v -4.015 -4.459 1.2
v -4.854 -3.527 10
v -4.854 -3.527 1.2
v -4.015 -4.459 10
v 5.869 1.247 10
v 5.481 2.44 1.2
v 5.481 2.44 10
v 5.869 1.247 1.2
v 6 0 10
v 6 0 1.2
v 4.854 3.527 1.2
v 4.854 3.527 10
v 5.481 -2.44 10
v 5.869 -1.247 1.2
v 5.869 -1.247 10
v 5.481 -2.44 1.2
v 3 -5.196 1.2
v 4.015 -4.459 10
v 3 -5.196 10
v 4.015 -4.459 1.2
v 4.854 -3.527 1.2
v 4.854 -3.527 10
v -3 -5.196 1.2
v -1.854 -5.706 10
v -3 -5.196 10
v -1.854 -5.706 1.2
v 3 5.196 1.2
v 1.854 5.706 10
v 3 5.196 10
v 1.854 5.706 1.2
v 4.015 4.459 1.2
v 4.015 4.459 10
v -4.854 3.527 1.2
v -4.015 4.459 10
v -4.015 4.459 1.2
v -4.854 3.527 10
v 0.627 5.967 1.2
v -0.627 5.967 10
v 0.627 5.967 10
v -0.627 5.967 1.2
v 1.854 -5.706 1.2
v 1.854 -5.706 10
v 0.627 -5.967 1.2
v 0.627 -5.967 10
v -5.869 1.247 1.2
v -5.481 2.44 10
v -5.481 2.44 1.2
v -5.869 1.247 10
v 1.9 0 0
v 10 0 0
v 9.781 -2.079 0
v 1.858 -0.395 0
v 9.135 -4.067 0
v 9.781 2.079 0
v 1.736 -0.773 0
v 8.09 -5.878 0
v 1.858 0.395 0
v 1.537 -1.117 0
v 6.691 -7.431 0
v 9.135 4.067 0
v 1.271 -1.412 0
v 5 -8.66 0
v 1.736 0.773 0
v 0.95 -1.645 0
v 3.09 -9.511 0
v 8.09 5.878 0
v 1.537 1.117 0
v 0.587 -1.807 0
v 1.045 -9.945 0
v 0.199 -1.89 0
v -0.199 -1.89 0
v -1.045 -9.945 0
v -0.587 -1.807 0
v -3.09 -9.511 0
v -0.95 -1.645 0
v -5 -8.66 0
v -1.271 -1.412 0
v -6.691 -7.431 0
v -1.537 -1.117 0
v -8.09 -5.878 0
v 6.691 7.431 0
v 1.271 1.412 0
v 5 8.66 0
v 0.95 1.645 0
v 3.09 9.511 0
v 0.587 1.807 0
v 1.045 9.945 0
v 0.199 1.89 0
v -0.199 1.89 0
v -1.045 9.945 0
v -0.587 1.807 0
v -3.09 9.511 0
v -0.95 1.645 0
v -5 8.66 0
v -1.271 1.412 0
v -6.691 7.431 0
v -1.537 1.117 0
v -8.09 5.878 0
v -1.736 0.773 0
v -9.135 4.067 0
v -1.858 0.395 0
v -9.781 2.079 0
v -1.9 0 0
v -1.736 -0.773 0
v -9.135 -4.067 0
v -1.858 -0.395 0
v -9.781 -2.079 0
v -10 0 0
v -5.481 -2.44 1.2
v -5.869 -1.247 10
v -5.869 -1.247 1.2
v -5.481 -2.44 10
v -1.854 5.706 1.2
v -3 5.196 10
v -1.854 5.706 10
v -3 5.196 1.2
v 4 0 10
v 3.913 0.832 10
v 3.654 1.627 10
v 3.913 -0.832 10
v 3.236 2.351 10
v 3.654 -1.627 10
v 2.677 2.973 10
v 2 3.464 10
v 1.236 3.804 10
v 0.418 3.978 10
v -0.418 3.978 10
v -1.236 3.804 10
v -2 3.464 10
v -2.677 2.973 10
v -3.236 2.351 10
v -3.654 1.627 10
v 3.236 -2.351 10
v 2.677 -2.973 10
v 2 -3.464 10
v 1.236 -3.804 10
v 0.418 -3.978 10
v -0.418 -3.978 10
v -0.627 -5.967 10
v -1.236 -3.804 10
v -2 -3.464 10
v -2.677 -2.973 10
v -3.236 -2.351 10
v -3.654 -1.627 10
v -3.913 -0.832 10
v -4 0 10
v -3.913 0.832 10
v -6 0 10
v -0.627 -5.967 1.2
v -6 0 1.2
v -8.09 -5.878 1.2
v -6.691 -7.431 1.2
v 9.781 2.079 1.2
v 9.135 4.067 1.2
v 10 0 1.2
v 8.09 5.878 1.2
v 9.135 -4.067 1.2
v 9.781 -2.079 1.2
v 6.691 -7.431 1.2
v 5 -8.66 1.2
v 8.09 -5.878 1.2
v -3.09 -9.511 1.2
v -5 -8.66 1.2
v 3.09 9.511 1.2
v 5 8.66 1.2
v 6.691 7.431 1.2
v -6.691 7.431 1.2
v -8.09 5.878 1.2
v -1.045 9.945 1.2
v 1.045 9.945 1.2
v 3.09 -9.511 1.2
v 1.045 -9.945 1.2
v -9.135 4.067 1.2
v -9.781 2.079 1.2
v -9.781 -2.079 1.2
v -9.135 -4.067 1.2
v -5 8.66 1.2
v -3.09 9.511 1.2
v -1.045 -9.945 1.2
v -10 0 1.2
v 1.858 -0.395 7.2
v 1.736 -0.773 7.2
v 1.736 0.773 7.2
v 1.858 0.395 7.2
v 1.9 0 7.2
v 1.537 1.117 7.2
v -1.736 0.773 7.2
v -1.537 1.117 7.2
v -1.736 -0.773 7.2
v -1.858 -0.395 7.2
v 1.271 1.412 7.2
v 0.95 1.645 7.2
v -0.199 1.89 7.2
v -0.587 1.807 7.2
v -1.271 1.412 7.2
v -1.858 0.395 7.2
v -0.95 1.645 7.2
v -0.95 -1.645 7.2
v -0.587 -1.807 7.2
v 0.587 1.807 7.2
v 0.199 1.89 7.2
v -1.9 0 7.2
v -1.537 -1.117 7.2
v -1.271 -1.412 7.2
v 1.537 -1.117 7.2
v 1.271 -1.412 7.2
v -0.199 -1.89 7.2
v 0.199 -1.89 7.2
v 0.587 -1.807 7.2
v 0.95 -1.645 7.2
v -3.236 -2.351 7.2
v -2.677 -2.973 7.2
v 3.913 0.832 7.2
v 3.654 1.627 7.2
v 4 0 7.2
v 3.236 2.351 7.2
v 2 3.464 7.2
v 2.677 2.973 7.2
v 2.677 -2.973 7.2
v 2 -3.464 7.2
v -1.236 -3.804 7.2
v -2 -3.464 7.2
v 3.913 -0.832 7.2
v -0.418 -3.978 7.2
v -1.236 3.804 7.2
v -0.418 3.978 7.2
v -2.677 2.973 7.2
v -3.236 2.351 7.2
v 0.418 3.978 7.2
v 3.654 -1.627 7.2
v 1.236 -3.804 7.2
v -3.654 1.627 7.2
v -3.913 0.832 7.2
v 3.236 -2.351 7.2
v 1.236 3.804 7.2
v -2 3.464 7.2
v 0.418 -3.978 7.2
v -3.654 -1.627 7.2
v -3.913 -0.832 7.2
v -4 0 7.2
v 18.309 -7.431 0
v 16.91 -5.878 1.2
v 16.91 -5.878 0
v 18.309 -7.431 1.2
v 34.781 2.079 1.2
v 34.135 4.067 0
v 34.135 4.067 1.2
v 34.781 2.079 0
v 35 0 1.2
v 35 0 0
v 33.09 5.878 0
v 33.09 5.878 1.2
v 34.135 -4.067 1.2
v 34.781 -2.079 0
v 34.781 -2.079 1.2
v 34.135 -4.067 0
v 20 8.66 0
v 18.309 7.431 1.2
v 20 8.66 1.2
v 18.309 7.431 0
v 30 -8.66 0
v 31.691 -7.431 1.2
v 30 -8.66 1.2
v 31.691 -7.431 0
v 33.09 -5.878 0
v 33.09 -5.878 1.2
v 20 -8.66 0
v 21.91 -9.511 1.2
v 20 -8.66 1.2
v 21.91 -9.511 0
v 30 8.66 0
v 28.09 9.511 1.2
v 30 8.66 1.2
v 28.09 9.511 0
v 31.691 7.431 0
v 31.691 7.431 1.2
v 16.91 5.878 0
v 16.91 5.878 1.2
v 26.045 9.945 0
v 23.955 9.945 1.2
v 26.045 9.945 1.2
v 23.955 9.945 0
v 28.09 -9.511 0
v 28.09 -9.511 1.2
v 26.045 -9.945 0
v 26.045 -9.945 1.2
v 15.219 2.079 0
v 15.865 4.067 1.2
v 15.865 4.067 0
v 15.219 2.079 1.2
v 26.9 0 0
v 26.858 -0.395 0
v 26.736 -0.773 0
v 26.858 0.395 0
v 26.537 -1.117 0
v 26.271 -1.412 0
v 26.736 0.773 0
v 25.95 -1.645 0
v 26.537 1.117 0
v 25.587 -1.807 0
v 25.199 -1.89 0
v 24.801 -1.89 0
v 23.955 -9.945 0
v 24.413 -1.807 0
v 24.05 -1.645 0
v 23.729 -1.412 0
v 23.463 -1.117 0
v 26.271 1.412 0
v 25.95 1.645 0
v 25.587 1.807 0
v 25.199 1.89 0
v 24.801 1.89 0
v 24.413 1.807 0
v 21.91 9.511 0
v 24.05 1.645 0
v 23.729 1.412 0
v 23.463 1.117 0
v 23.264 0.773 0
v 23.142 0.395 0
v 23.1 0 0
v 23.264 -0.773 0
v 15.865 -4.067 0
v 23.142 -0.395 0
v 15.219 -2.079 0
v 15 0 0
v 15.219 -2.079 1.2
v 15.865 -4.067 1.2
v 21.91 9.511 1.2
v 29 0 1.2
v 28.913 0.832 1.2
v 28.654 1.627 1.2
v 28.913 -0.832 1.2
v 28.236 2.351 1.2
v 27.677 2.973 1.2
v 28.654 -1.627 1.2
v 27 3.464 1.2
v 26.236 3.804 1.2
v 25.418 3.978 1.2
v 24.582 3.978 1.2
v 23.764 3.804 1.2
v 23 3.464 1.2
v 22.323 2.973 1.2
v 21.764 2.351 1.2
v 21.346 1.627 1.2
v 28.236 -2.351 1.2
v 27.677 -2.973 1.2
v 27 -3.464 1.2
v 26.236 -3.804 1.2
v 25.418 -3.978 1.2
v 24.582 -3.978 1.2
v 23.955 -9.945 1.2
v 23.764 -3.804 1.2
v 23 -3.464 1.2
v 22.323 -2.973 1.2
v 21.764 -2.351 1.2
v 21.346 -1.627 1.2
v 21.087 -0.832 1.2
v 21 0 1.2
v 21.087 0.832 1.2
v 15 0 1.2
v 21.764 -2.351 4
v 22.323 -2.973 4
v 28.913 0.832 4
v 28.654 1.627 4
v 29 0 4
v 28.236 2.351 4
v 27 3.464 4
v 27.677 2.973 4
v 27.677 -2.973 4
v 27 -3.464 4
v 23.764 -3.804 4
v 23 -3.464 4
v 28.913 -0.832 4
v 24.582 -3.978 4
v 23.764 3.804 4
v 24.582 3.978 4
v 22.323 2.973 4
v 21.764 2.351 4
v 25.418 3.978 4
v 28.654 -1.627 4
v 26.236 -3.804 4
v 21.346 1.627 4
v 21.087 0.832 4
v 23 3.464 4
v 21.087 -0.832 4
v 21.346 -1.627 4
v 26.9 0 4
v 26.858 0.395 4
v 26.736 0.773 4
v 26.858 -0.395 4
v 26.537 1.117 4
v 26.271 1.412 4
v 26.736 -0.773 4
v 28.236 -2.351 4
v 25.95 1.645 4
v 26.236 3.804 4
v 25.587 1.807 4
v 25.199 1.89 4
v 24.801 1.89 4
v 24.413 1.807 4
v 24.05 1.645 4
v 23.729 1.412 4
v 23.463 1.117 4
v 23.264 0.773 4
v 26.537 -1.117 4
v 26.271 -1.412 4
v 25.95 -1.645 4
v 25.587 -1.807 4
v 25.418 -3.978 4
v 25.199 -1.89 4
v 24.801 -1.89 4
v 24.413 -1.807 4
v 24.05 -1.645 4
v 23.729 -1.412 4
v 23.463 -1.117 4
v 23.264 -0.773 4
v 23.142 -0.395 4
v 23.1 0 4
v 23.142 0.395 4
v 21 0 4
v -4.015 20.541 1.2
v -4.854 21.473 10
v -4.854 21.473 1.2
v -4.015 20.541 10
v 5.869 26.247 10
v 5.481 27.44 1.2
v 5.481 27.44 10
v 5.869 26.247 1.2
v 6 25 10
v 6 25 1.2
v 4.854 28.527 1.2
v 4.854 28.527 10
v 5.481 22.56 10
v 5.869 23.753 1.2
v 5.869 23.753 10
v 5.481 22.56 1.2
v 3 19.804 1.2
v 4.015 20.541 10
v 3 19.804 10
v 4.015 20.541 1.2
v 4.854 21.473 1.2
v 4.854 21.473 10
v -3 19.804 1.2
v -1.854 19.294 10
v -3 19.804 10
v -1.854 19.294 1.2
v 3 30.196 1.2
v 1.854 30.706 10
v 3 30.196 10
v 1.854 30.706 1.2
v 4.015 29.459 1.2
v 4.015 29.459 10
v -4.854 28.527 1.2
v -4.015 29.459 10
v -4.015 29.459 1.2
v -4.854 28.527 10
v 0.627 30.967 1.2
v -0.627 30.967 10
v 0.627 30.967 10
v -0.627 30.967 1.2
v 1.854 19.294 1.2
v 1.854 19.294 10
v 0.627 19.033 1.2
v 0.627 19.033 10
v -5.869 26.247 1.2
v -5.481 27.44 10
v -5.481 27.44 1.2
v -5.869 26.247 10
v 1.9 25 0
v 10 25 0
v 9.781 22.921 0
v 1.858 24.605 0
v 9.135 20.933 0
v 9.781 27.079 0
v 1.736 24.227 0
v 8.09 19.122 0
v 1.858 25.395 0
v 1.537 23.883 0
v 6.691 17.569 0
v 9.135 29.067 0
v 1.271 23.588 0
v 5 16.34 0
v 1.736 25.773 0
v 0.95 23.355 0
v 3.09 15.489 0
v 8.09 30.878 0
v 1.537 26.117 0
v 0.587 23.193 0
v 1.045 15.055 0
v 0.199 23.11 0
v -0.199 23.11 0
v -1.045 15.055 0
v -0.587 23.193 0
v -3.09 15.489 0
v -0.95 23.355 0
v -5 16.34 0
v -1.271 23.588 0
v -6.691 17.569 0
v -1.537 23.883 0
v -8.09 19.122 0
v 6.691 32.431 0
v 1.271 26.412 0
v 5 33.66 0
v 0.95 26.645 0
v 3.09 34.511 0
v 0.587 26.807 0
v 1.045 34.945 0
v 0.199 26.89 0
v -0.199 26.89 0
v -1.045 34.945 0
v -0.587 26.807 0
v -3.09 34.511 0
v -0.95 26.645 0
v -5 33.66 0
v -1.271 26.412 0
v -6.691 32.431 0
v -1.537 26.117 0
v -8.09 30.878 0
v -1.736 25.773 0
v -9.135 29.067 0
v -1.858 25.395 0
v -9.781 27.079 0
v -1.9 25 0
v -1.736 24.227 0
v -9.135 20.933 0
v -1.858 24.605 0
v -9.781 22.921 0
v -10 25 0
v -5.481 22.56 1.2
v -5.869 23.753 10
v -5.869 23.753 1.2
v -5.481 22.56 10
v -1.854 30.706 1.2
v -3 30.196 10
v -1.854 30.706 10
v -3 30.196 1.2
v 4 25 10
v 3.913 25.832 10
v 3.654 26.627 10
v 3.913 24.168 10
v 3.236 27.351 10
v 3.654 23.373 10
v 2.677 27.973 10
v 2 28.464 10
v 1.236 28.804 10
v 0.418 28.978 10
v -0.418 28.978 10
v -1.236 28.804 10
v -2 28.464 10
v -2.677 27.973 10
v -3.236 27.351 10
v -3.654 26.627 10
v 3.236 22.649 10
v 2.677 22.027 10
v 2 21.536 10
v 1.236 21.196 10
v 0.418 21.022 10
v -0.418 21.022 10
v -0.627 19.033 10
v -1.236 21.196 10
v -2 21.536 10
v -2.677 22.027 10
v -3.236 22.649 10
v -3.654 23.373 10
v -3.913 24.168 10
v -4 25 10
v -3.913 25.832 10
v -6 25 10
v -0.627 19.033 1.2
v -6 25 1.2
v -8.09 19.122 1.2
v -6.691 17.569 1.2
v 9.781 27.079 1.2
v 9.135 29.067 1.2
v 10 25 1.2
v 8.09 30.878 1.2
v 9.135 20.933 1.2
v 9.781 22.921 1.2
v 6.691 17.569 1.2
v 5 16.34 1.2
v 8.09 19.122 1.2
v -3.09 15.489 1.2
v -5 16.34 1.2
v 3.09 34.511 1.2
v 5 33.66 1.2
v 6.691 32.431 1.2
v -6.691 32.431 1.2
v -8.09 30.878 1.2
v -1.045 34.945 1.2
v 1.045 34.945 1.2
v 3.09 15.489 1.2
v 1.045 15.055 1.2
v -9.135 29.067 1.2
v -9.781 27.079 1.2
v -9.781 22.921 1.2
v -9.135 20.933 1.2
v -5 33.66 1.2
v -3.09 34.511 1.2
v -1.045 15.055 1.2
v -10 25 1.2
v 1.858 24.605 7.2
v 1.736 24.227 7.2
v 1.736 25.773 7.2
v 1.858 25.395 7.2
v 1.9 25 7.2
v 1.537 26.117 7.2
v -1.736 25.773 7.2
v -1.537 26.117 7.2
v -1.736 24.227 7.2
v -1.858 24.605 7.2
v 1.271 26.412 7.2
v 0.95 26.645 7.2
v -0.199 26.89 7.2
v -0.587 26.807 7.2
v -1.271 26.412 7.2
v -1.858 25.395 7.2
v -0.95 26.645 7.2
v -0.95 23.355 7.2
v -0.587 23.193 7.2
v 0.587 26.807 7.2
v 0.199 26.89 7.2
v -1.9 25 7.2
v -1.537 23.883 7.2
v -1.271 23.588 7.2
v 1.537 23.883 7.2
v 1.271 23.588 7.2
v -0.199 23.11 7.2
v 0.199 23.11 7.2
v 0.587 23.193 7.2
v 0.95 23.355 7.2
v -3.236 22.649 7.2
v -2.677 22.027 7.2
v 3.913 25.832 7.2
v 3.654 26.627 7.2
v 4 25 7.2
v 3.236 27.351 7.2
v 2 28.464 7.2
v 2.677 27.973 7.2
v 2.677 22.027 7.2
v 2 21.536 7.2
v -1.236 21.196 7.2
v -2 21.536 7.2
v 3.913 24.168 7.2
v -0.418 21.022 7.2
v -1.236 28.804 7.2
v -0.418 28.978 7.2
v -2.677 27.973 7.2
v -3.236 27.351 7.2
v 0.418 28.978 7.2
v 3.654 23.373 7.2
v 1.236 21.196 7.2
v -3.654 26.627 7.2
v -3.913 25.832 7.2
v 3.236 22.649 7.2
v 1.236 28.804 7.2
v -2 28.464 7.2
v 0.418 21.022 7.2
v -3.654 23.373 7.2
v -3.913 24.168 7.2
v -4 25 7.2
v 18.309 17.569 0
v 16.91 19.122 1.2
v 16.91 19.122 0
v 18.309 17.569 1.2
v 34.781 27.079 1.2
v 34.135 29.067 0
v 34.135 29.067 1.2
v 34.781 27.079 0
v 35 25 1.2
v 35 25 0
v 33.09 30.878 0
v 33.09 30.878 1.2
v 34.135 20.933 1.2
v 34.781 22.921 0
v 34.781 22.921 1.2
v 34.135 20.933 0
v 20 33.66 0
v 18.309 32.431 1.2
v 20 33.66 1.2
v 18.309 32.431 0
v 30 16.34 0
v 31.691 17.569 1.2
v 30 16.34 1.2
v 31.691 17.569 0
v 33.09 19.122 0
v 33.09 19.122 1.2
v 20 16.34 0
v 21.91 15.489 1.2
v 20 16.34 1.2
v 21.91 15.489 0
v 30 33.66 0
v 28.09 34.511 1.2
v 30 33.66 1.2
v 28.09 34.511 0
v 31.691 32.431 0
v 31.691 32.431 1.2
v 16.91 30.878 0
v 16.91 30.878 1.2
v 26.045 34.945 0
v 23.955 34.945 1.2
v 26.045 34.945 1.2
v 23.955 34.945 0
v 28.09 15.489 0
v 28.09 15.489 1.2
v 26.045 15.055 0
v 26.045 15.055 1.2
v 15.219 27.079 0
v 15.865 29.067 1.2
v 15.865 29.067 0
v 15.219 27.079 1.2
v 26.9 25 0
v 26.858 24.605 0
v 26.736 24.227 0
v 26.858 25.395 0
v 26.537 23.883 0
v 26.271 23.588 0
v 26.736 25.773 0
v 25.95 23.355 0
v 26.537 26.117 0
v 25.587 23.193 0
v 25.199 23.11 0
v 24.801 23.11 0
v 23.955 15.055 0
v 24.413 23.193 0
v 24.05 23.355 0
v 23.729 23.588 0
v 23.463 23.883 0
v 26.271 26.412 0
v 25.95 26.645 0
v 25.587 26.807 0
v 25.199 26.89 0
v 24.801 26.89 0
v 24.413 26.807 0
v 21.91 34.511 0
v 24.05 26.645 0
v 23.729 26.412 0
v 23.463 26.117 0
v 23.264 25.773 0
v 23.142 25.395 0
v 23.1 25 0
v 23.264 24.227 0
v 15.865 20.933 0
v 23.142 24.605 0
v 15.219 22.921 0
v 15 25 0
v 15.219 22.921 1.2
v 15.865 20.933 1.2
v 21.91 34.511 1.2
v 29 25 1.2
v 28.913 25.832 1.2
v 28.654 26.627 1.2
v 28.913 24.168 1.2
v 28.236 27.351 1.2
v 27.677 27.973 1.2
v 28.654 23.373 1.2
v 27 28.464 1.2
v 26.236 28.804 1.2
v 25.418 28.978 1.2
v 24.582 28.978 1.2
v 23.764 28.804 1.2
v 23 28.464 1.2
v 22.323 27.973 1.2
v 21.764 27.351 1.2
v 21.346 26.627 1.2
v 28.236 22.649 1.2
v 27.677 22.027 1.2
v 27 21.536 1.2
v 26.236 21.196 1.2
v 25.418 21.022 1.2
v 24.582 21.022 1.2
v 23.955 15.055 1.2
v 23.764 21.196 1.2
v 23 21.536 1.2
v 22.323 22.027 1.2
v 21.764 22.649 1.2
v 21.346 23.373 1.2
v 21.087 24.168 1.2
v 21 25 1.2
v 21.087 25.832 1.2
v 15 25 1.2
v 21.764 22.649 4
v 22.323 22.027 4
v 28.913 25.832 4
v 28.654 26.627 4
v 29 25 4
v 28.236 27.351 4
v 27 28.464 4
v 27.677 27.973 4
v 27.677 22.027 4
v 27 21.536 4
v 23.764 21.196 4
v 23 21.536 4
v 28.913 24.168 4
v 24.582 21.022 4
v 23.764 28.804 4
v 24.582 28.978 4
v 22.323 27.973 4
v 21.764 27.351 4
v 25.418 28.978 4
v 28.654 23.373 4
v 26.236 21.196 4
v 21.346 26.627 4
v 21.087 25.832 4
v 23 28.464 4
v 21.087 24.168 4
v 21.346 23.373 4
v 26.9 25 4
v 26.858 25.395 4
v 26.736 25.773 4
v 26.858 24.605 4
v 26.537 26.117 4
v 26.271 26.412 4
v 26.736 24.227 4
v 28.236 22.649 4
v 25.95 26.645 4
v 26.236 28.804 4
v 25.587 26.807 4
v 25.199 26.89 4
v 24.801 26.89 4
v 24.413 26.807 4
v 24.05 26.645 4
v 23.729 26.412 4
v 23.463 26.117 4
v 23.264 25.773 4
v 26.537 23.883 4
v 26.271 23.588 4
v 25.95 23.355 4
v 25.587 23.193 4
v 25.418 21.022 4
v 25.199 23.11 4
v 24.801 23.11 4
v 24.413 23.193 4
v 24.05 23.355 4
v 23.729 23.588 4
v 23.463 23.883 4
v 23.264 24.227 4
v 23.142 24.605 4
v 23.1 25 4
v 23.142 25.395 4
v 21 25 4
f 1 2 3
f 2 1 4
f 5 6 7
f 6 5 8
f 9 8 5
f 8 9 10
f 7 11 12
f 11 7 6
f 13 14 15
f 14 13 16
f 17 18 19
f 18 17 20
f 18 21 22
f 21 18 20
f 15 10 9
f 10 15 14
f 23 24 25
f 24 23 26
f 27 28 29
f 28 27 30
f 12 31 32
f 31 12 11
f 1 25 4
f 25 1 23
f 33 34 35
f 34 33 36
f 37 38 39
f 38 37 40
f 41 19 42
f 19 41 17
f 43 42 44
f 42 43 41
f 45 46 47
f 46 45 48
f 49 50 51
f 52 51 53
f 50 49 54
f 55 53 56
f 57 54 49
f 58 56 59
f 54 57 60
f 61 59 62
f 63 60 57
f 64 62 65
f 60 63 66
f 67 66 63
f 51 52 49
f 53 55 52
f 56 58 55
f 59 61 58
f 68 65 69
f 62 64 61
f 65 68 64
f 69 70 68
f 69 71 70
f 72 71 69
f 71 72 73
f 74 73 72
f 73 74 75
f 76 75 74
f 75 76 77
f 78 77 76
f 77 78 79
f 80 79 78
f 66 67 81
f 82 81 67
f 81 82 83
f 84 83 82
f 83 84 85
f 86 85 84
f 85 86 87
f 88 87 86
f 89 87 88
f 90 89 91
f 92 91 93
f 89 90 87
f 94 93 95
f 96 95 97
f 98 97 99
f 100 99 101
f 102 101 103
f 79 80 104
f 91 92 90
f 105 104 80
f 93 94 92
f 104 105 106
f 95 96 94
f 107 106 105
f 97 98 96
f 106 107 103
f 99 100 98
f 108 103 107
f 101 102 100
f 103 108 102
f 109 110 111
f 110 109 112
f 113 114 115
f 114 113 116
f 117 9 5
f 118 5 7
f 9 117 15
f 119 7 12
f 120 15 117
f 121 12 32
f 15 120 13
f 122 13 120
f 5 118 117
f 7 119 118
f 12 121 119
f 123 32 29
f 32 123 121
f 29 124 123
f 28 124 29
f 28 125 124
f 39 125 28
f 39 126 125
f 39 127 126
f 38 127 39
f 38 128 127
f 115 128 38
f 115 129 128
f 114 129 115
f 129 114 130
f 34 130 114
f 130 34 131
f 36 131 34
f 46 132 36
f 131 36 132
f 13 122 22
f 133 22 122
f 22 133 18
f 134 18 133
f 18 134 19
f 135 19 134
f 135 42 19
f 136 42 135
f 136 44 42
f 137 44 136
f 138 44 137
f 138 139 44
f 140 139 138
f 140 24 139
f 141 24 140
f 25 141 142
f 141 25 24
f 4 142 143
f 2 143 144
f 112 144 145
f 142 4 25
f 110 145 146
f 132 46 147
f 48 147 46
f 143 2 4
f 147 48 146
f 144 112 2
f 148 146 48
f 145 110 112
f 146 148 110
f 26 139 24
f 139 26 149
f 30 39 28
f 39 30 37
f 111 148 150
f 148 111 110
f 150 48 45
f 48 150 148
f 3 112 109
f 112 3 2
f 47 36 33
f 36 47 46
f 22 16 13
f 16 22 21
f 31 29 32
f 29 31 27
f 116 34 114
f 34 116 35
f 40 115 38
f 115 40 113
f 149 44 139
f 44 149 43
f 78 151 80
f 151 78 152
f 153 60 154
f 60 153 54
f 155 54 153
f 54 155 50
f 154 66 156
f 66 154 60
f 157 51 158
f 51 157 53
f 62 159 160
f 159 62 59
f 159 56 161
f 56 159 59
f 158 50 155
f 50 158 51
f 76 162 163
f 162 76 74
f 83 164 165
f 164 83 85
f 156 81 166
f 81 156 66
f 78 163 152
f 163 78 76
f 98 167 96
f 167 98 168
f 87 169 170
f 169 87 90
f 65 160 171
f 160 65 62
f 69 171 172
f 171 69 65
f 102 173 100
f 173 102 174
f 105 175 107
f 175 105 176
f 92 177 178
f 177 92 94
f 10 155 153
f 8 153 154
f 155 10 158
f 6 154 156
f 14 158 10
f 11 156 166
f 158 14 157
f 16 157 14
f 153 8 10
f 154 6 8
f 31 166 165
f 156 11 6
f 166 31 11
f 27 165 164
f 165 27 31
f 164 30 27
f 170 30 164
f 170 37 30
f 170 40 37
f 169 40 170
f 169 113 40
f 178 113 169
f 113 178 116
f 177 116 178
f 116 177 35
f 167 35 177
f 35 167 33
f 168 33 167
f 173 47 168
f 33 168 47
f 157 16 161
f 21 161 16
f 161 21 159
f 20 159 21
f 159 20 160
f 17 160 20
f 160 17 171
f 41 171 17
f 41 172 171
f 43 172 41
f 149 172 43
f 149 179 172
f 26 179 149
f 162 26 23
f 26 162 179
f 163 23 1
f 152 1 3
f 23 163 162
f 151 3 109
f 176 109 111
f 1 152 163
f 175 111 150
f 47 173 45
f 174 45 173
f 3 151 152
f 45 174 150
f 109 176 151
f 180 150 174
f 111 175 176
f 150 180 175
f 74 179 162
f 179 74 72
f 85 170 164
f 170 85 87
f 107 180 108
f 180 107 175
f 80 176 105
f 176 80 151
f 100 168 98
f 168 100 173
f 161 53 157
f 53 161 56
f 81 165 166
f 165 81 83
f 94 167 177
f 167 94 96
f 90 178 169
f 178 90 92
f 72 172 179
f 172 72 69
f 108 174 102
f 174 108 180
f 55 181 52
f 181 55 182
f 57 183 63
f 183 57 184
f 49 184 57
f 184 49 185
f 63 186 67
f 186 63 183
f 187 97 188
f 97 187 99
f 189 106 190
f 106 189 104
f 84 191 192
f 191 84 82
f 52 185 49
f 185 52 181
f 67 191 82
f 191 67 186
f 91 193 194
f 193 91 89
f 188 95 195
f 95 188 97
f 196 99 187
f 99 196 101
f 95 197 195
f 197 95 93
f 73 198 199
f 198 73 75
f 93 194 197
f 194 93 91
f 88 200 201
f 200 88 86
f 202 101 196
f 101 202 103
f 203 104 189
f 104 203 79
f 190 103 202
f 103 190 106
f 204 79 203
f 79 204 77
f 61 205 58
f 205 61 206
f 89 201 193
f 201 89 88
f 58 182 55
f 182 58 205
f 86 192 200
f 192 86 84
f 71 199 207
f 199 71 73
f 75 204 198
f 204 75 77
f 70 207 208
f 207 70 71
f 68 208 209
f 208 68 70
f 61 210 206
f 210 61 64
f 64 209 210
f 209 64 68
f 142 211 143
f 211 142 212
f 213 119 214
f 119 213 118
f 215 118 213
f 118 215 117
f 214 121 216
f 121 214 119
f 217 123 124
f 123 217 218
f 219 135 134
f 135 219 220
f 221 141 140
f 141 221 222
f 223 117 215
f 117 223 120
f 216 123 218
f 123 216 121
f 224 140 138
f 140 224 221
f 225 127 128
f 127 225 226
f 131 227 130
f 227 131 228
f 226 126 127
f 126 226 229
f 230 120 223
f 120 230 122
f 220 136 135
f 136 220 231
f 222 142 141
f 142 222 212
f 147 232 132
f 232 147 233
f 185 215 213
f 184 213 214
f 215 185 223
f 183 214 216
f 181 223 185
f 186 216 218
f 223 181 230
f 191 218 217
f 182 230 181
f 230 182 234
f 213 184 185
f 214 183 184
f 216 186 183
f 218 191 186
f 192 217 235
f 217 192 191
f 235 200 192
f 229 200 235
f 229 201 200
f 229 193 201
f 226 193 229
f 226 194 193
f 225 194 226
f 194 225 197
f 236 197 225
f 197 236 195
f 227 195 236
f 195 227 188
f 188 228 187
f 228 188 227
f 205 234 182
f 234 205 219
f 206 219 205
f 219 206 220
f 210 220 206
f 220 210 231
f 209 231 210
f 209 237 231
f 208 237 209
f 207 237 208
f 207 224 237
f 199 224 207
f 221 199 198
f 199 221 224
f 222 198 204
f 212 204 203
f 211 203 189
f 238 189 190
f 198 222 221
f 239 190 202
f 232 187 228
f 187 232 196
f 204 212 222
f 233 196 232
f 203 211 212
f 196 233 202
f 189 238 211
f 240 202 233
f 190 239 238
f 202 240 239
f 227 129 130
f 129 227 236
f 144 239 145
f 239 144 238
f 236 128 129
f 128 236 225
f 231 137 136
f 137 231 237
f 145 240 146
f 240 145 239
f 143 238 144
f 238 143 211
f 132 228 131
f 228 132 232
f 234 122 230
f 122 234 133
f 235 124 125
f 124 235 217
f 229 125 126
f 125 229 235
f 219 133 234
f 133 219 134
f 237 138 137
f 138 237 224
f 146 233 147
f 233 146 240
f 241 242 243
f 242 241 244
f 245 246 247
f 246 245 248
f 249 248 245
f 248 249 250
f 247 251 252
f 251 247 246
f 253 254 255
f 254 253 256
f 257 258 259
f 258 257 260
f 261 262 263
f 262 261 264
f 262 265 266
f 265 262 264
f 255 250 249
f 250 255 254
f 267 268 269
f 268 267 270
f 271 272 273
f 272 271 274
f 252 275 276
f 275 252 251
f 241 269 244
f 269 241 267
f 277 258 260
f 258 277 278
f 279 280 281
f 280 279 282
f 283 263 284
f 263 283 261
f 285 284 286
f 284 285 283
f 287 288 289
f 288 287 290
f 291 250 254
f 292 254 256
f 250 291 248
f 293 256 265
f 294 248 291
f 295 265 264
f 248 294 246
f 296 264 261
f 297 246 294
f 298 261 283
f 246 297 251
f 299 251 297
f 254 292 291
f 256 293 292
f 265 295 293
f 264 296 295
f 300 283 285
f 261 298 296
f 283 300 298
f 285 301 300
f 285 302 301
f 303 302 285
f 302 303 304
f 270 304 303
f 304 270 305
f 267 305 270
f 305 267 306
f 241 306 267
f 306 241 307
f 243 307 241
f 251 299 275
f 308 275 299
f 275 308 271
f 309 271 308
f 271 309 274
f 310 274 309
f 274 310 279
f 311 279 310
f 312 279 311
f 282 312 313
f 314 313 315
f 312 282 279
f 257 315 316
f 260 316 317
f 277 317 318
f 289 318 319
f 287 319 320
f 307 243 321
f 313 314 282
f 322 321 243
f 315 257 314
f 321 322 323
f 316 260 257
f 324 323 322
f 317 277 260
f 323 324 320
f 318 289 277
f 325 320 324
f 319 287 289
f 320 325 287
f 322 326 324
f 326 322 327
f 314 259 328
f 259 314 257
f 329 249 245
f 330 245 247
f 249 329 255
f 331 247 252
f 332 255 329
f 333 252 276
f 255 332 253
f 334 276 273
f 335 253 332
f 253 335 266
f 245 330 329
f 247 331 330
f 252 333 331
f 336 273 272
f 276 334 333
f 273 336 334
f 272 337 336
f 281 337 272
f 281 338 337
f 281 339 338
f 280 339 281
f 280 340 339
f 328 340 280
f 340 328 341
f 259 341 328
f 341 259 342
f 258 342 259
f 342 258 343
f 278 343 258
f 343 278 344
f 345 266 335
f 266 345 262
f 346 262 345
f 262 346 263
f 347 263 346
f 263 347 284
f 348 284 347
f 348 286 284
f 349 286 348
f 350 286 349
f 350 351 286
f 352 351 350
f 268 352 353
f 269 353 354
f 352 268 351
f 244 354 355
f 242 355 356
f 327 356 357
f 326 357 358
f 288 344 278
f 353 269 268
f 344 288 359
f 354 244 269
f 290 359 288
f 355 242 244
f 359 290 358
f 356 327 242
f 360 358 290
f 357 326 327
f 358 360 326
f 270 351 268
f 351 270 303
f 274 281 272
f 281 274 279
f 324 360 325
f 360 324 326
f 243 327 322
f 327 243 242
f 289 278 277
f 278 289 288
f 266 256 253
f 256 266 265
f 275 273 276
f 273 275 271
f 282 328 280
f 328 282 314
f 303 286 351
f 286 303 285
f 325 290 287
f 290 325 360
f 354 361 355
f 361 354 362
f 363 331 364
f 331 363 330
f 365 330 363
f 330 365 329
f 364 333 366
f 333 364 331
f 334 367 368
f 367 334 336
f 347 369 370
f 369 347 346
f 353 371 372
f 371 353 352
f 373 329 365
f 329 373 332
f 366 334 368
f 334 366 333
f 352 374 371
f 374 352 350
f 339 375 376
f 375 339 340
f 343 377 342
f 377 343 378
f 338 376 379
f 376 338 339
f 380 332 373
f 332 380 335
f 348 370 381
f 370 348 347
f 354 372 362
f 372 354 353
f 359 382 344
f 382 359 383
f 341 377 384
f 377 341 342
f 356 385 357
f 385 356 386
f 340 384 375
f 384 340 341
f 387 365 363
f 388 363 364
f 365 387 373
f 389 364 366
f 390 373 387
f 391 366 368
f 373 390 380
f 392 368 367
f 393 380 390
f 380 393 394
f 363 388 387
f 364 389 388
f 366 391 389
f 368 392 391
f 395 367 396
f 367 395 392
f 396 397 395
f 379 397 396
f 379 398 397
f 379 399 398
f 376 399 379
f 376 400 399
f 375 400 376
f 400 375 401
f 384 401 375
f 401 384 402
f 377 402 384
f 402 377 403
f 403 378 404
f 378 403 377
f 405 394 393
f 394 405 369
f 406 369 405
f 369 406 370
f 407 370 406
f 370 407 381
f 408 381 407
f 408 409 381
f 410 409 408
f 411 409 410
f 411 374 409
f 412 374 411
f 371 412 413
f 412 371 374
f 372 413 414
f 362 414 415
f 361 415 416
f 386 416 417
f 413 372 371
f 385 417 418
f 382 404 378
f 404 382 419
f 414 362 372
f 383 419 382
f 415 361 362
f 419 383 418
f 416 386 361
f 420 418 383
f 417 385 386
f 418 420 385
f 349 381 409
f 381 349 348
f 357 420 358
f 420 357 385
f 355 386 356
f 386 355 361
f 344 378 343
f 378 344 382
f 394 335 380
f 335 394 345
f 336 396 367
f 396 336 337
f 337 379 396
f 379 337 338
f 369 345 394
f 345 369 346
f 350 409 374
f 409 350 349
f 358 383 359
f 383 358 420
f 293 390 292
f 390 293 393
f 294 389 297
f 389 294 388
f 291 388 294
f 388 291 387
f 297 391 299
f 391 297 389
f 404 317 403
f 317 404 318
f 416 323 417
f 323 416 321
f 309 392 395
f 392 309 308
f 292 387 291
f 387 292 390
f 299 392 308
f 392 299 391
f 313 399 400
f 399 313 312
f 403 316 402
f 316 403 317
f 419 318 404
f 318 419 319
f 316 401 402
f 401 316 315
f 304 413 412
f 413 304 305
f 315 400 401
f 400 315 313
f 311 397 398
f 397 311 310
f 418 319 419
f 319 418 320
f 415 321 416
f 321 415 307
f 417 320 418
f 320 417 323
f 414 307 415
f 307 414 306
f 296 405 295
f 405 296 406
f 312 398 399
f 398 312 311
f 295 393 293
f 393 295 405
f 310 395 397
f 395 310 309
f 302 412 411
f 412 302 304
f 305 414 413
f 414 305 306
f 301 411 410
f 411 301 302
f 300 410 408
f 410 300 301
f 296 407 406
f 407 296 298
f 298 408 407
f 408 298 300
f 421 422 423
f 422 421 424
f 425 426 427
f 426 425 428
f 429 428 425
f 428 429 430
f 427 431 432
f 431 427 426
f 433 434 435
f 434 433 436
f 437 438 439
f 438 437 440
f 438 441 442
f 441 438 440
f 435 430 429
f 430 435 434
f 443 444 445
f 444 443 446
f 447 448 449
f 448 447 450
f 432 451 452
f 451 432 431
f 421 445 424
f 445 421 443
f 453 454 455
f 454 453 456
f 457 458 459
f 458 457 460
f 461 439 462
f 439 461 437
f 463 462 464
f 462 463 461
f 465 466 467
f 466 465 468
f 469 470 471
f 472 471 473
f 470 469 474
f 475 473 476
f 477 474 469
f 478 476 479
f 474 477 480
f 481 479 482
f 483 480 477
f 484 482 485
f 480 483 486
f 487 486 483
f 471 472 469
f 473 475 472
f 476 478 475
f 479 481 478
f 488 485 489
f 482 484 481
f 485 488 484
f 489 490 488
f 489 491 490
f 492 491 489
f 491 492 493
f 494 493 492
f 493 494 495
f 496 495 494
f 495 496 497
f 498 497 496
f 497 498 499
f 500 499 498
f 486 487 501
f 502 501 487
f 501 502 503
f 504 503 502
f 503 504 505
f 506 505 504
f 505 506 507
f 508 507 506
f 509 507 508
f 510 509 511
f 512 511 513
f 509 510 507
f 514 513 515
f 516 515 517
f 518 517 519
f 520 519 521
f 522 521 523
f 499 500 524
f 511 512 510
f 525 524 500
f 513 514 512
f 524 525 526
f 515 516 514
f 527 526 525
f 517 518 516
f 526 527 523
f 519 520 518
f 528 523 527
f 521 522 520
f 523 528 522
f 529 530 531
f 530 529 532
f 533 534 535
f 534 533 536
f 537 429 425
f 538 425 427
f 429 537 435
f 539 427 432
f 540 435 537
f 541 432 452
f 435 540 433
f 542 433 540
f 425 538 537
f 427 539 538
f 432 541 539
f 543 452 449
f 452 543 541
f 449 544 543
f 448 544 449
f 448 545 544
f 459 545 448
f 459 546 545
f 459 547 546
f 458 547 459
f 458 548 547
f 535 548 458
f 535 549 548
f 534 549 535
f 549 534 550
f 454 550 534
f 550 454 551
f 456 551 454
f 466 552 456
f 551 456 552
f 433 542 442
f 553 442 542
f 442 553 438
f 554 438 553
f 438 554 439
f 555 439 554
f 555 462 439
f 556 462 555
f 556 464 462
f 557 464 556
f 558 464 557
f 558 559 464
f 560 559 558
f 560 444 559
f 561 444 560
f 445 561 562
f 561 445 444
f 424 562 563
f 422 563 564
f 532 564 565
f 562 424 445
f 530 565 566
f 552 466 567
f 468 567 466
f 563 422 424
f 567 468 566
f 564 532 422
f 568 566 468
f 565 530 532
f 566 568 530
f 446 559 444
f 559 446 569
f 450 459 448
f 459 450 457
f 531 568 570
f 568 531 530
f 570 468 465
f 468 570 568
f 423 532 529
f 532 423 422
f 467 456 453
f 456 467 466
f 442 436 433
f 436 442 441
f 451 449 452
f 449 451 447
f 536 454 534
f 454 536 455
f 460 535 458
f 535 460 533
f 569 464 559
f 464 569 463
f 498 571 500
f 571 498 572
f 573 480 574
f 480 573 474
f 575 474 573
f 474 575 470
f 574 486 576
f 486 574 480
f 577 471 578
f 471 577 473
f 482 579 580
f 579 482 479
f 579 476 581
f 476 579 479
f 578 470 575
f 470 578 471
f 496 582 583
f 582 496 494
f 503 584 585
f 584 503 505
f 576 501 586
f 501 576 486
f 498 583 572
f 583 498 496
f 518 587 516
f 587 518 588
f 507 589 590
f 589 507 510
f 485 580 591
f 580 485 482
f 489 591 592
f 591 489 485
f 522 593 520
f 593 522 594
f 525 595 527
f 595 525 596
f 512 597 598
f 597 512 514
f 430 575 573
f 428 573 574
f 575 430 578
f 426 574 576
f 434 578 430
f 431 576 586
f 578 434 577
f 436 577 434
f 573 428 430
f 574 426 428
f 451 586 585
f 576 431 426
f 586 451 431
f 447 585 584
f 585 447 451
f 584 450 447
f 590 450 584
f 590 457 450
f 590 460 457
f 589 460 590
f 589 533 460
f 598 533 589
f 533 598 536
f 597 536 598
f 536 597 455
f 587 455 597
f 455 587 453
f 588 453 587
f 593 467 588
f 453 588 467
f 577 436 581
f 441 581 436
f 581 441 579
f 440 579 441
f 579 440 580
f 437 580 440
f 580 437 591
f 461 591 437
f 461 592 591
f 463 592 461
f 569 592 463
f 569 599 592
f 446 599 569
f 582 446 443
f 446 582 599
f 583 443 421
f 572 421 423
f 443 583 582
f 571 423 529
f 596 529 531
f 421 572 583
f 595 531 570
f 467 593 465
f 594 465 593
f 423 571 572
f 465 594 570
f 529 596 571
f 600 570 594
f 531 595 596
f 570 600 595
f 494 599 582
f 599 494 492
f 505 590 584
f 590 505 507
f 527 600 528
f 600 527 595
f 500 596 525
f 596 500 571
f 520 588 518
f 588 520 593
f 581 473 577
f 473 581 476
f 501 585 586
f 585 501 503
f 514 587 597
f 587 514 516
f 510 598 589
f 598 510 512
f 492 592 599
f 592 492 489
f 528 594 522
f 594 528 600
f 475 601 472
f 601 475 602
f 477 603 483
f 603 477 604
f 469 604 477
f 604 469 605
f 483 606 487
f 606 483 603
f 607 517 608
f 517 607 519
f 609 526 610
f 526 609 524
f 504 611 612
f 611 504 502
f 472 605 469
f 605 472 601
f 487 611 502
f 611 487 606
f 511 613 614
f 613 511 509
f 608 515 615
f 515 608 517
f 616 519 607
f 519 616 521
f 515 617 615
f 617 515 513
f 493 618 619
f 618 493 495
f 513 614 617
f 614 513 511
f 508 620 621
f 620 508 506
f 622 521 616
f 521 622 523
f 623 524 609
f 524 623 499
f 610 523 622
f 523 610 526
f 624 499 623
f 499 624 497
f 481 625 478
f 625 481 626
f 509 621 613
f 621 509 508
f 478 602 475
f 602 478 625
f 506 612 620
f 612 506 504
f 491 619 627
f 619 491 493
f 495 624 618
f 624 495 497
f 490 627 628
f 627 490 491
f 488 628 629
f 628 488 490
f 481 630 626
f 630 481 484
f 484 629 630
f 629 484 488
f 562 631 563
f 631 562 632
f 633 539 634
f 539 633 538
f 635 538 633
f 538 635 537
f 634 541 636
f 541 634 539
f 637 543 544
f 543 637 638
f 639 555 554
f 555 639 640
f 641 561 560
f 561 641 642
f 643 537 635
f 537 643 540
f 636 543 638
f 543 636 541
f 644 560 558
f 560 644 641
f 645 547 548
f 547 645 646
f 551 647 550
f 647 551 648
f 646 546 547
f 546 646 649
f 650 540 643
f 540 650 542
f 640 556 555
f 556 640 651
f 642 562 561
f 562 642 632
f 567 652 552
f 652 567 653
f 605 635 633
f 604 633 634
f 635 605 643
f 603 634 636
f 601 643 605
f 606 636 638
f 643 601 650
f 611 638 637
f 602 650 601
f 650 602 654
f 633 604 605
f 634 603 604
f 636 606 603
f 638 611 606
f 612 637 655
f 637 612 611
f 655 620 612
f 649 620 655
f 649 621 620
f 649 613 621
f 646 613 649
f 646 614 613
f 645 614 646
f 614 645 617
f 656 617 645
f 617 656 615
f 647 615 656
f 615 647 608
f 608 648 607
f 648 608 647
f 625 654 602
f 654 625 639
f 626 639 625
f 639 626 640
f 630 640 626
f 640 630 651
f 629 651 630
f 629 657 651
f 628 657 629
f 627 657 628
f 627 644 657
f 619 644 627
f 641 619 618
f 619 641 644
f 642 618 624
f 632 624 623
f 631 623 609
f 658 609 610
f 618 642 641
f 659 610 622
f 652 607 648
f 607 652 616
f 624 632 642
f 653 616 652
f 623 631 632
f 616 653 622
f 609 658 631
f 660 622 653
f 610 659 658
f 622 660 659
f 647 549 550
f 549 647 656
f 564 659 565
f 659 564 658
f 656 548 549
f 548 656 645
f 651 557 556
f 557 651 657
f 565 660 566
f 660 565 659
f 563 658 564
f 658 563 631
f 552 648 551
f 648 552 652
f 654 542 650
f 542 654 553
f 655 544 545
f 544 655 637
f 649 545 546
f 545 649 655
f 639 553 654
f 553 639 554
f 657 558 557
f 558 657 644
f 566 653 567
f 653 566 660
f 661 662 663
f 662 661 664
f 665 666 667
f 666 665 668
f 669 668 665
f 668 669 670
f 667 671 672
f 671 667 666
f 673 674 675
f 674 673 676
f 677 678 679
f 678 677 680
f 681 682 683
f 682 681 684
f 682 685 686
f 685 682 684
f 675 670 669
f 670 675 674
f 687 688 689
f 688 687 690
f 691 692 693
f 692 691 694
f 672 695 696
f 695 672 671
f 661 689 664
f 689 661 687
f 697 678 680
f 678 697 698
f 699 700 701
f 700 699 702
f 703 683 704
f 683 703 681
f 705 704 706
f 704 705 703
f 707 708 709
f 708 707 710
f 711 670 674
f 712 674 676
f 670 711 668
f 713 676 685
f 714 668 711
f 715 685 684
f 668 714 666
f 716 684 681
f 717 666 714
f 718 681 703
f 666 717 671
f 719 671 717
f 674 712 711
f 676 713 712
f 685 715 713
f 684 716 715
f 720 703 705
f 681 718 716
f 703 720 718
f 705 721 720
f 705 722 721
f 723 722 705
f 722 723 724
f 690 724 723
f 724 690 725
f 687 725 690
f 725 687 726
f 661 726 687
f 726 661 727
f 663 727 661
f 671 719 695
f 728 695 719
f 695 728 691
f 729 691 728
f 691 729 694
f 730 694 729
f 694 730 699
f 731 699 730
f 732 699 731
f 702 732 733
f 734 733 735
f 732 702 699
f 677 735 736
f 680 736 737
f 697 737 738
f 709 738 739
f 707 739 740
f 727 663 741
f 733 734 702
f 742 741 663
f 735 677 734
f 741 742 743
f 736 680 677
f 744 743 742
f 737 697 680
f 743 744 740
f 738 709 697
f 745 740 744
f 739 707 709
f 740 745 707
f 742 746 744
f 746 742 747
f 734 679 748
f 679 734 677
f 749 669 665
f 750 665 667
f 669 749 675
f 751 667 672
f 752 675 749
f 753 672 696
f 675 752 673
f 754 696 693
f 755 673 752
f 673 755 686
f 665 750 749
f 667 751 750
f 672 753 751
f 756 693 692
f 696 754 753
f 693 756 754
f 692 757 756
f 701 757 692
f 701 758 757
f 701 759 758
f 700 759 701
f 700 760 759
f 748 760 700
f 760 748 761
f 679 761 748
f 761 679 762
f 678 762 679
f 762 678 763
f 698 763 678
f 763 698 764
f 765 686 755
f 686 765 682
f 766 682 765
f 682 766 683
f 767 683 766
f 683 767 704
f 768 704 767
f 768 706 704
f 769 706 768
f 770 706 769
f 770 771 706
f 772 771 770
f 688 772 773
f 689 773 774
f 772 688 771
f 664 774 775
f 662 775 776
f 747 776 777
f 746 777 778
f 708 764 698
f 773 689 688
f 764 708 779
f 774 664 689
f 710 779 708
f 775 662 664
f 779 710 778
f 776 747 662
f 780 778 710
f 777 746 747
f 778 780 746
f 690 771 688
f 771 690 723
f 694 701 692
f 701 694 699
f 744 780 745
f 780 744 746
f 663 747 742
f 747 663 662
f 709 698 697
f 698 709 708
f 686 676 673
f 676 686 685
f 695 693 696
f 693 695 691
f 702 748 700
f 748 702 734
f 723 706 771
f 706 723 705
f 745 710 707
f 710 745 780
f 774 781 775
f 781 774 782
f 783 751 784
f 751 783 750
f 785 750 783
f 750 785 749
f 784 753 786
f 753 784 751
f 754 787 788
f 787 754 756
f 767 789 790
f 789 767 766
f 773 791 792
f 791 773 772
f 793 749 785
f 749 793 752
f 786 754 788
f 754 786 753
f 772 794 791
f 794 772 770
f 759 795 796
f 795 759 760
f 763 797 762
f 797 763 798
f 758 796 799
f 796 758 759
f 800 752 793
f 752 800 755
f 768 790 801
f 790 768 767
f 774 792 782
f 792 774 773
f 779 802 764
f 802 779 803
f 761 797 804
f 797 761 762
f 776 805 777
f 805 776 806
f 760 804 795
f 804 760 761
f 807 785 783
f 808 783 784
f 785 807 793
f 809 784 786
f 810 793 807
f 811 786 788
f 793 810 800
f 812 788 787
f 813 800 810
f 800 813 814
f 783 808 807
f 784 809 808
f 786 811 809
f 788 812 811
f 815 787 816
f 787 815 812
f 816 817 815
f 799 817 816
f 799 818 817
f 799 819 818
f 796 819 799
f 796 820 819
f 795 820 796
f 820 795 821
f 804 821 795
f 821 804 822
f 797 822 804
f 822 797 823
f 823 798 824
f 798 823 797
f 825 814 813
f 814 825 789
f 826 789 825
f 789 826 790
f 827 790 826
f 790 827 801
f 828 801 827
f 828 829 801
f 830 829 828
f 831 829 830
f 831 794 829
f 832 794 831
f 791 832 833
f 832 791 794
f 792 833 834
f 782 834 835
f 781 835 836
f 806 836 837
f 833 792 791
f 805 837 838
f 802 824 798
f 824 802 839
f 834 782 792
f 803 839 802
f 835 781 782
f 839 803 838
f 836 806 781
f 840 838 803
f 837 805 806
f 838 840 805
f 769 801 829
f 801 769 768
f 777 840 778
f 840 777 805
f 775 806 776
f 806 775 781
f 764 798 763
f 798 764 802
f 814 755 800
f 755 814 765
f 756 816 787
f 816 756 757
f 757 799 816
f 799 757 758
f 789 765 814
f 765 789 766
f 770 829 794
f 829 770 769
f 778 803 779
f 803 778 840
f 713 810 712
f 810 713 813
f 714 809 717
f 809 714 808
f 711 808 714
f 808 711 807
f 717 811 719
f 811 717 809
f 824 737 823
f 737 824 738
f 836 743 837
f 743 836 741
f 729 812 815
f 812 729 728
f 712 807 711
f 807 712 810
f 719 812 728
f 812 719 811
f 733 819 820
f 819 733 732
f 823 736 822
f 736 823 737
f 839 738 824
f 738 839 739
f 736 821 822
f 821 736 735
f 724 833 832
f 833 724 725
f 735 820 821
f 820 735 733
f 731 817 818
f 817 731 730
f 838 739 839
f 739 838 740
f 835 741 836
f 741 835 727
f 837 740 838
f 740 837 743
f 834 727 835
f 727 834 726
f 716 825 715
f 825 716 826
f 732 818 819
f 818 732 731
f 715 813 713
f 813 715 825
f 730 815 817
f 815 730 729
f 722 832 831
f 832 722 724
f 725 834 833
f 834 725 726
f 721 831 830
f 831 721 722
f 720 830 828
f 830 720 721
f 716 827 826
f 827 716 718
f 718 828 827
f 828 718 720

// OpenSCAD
module pulley()
{
	difference()
	{
	  union()
	  {
	    cylinder(h=10.0,r=6.0,$fs=0.1);
	
	    cylinder(h=1.2,r=10,$fs=0.1);
	  }
	  cylinder(h=10.1,r=1.9,$fs=0.1);

        translate(v=[0,0,10-2.8])
        {
	    cylinder(h=2.9,r=4,$fs=0.1);
        }
	}
	
	translate(v=[25,0,0])
	{
	  difference()
	  {
          union()
          {
	      cylinder(h=1.2,r=10,$fs=0.1);
	      cylinder(h=1.2+2.8,r=4,$fs=0.1);
          }
	
	    cylinder(h=1.2+2.8,r=1.9,$fs=0.1);
	  }
	}

}

pulley();

translate(v=[0,25,0])
  pulley();
